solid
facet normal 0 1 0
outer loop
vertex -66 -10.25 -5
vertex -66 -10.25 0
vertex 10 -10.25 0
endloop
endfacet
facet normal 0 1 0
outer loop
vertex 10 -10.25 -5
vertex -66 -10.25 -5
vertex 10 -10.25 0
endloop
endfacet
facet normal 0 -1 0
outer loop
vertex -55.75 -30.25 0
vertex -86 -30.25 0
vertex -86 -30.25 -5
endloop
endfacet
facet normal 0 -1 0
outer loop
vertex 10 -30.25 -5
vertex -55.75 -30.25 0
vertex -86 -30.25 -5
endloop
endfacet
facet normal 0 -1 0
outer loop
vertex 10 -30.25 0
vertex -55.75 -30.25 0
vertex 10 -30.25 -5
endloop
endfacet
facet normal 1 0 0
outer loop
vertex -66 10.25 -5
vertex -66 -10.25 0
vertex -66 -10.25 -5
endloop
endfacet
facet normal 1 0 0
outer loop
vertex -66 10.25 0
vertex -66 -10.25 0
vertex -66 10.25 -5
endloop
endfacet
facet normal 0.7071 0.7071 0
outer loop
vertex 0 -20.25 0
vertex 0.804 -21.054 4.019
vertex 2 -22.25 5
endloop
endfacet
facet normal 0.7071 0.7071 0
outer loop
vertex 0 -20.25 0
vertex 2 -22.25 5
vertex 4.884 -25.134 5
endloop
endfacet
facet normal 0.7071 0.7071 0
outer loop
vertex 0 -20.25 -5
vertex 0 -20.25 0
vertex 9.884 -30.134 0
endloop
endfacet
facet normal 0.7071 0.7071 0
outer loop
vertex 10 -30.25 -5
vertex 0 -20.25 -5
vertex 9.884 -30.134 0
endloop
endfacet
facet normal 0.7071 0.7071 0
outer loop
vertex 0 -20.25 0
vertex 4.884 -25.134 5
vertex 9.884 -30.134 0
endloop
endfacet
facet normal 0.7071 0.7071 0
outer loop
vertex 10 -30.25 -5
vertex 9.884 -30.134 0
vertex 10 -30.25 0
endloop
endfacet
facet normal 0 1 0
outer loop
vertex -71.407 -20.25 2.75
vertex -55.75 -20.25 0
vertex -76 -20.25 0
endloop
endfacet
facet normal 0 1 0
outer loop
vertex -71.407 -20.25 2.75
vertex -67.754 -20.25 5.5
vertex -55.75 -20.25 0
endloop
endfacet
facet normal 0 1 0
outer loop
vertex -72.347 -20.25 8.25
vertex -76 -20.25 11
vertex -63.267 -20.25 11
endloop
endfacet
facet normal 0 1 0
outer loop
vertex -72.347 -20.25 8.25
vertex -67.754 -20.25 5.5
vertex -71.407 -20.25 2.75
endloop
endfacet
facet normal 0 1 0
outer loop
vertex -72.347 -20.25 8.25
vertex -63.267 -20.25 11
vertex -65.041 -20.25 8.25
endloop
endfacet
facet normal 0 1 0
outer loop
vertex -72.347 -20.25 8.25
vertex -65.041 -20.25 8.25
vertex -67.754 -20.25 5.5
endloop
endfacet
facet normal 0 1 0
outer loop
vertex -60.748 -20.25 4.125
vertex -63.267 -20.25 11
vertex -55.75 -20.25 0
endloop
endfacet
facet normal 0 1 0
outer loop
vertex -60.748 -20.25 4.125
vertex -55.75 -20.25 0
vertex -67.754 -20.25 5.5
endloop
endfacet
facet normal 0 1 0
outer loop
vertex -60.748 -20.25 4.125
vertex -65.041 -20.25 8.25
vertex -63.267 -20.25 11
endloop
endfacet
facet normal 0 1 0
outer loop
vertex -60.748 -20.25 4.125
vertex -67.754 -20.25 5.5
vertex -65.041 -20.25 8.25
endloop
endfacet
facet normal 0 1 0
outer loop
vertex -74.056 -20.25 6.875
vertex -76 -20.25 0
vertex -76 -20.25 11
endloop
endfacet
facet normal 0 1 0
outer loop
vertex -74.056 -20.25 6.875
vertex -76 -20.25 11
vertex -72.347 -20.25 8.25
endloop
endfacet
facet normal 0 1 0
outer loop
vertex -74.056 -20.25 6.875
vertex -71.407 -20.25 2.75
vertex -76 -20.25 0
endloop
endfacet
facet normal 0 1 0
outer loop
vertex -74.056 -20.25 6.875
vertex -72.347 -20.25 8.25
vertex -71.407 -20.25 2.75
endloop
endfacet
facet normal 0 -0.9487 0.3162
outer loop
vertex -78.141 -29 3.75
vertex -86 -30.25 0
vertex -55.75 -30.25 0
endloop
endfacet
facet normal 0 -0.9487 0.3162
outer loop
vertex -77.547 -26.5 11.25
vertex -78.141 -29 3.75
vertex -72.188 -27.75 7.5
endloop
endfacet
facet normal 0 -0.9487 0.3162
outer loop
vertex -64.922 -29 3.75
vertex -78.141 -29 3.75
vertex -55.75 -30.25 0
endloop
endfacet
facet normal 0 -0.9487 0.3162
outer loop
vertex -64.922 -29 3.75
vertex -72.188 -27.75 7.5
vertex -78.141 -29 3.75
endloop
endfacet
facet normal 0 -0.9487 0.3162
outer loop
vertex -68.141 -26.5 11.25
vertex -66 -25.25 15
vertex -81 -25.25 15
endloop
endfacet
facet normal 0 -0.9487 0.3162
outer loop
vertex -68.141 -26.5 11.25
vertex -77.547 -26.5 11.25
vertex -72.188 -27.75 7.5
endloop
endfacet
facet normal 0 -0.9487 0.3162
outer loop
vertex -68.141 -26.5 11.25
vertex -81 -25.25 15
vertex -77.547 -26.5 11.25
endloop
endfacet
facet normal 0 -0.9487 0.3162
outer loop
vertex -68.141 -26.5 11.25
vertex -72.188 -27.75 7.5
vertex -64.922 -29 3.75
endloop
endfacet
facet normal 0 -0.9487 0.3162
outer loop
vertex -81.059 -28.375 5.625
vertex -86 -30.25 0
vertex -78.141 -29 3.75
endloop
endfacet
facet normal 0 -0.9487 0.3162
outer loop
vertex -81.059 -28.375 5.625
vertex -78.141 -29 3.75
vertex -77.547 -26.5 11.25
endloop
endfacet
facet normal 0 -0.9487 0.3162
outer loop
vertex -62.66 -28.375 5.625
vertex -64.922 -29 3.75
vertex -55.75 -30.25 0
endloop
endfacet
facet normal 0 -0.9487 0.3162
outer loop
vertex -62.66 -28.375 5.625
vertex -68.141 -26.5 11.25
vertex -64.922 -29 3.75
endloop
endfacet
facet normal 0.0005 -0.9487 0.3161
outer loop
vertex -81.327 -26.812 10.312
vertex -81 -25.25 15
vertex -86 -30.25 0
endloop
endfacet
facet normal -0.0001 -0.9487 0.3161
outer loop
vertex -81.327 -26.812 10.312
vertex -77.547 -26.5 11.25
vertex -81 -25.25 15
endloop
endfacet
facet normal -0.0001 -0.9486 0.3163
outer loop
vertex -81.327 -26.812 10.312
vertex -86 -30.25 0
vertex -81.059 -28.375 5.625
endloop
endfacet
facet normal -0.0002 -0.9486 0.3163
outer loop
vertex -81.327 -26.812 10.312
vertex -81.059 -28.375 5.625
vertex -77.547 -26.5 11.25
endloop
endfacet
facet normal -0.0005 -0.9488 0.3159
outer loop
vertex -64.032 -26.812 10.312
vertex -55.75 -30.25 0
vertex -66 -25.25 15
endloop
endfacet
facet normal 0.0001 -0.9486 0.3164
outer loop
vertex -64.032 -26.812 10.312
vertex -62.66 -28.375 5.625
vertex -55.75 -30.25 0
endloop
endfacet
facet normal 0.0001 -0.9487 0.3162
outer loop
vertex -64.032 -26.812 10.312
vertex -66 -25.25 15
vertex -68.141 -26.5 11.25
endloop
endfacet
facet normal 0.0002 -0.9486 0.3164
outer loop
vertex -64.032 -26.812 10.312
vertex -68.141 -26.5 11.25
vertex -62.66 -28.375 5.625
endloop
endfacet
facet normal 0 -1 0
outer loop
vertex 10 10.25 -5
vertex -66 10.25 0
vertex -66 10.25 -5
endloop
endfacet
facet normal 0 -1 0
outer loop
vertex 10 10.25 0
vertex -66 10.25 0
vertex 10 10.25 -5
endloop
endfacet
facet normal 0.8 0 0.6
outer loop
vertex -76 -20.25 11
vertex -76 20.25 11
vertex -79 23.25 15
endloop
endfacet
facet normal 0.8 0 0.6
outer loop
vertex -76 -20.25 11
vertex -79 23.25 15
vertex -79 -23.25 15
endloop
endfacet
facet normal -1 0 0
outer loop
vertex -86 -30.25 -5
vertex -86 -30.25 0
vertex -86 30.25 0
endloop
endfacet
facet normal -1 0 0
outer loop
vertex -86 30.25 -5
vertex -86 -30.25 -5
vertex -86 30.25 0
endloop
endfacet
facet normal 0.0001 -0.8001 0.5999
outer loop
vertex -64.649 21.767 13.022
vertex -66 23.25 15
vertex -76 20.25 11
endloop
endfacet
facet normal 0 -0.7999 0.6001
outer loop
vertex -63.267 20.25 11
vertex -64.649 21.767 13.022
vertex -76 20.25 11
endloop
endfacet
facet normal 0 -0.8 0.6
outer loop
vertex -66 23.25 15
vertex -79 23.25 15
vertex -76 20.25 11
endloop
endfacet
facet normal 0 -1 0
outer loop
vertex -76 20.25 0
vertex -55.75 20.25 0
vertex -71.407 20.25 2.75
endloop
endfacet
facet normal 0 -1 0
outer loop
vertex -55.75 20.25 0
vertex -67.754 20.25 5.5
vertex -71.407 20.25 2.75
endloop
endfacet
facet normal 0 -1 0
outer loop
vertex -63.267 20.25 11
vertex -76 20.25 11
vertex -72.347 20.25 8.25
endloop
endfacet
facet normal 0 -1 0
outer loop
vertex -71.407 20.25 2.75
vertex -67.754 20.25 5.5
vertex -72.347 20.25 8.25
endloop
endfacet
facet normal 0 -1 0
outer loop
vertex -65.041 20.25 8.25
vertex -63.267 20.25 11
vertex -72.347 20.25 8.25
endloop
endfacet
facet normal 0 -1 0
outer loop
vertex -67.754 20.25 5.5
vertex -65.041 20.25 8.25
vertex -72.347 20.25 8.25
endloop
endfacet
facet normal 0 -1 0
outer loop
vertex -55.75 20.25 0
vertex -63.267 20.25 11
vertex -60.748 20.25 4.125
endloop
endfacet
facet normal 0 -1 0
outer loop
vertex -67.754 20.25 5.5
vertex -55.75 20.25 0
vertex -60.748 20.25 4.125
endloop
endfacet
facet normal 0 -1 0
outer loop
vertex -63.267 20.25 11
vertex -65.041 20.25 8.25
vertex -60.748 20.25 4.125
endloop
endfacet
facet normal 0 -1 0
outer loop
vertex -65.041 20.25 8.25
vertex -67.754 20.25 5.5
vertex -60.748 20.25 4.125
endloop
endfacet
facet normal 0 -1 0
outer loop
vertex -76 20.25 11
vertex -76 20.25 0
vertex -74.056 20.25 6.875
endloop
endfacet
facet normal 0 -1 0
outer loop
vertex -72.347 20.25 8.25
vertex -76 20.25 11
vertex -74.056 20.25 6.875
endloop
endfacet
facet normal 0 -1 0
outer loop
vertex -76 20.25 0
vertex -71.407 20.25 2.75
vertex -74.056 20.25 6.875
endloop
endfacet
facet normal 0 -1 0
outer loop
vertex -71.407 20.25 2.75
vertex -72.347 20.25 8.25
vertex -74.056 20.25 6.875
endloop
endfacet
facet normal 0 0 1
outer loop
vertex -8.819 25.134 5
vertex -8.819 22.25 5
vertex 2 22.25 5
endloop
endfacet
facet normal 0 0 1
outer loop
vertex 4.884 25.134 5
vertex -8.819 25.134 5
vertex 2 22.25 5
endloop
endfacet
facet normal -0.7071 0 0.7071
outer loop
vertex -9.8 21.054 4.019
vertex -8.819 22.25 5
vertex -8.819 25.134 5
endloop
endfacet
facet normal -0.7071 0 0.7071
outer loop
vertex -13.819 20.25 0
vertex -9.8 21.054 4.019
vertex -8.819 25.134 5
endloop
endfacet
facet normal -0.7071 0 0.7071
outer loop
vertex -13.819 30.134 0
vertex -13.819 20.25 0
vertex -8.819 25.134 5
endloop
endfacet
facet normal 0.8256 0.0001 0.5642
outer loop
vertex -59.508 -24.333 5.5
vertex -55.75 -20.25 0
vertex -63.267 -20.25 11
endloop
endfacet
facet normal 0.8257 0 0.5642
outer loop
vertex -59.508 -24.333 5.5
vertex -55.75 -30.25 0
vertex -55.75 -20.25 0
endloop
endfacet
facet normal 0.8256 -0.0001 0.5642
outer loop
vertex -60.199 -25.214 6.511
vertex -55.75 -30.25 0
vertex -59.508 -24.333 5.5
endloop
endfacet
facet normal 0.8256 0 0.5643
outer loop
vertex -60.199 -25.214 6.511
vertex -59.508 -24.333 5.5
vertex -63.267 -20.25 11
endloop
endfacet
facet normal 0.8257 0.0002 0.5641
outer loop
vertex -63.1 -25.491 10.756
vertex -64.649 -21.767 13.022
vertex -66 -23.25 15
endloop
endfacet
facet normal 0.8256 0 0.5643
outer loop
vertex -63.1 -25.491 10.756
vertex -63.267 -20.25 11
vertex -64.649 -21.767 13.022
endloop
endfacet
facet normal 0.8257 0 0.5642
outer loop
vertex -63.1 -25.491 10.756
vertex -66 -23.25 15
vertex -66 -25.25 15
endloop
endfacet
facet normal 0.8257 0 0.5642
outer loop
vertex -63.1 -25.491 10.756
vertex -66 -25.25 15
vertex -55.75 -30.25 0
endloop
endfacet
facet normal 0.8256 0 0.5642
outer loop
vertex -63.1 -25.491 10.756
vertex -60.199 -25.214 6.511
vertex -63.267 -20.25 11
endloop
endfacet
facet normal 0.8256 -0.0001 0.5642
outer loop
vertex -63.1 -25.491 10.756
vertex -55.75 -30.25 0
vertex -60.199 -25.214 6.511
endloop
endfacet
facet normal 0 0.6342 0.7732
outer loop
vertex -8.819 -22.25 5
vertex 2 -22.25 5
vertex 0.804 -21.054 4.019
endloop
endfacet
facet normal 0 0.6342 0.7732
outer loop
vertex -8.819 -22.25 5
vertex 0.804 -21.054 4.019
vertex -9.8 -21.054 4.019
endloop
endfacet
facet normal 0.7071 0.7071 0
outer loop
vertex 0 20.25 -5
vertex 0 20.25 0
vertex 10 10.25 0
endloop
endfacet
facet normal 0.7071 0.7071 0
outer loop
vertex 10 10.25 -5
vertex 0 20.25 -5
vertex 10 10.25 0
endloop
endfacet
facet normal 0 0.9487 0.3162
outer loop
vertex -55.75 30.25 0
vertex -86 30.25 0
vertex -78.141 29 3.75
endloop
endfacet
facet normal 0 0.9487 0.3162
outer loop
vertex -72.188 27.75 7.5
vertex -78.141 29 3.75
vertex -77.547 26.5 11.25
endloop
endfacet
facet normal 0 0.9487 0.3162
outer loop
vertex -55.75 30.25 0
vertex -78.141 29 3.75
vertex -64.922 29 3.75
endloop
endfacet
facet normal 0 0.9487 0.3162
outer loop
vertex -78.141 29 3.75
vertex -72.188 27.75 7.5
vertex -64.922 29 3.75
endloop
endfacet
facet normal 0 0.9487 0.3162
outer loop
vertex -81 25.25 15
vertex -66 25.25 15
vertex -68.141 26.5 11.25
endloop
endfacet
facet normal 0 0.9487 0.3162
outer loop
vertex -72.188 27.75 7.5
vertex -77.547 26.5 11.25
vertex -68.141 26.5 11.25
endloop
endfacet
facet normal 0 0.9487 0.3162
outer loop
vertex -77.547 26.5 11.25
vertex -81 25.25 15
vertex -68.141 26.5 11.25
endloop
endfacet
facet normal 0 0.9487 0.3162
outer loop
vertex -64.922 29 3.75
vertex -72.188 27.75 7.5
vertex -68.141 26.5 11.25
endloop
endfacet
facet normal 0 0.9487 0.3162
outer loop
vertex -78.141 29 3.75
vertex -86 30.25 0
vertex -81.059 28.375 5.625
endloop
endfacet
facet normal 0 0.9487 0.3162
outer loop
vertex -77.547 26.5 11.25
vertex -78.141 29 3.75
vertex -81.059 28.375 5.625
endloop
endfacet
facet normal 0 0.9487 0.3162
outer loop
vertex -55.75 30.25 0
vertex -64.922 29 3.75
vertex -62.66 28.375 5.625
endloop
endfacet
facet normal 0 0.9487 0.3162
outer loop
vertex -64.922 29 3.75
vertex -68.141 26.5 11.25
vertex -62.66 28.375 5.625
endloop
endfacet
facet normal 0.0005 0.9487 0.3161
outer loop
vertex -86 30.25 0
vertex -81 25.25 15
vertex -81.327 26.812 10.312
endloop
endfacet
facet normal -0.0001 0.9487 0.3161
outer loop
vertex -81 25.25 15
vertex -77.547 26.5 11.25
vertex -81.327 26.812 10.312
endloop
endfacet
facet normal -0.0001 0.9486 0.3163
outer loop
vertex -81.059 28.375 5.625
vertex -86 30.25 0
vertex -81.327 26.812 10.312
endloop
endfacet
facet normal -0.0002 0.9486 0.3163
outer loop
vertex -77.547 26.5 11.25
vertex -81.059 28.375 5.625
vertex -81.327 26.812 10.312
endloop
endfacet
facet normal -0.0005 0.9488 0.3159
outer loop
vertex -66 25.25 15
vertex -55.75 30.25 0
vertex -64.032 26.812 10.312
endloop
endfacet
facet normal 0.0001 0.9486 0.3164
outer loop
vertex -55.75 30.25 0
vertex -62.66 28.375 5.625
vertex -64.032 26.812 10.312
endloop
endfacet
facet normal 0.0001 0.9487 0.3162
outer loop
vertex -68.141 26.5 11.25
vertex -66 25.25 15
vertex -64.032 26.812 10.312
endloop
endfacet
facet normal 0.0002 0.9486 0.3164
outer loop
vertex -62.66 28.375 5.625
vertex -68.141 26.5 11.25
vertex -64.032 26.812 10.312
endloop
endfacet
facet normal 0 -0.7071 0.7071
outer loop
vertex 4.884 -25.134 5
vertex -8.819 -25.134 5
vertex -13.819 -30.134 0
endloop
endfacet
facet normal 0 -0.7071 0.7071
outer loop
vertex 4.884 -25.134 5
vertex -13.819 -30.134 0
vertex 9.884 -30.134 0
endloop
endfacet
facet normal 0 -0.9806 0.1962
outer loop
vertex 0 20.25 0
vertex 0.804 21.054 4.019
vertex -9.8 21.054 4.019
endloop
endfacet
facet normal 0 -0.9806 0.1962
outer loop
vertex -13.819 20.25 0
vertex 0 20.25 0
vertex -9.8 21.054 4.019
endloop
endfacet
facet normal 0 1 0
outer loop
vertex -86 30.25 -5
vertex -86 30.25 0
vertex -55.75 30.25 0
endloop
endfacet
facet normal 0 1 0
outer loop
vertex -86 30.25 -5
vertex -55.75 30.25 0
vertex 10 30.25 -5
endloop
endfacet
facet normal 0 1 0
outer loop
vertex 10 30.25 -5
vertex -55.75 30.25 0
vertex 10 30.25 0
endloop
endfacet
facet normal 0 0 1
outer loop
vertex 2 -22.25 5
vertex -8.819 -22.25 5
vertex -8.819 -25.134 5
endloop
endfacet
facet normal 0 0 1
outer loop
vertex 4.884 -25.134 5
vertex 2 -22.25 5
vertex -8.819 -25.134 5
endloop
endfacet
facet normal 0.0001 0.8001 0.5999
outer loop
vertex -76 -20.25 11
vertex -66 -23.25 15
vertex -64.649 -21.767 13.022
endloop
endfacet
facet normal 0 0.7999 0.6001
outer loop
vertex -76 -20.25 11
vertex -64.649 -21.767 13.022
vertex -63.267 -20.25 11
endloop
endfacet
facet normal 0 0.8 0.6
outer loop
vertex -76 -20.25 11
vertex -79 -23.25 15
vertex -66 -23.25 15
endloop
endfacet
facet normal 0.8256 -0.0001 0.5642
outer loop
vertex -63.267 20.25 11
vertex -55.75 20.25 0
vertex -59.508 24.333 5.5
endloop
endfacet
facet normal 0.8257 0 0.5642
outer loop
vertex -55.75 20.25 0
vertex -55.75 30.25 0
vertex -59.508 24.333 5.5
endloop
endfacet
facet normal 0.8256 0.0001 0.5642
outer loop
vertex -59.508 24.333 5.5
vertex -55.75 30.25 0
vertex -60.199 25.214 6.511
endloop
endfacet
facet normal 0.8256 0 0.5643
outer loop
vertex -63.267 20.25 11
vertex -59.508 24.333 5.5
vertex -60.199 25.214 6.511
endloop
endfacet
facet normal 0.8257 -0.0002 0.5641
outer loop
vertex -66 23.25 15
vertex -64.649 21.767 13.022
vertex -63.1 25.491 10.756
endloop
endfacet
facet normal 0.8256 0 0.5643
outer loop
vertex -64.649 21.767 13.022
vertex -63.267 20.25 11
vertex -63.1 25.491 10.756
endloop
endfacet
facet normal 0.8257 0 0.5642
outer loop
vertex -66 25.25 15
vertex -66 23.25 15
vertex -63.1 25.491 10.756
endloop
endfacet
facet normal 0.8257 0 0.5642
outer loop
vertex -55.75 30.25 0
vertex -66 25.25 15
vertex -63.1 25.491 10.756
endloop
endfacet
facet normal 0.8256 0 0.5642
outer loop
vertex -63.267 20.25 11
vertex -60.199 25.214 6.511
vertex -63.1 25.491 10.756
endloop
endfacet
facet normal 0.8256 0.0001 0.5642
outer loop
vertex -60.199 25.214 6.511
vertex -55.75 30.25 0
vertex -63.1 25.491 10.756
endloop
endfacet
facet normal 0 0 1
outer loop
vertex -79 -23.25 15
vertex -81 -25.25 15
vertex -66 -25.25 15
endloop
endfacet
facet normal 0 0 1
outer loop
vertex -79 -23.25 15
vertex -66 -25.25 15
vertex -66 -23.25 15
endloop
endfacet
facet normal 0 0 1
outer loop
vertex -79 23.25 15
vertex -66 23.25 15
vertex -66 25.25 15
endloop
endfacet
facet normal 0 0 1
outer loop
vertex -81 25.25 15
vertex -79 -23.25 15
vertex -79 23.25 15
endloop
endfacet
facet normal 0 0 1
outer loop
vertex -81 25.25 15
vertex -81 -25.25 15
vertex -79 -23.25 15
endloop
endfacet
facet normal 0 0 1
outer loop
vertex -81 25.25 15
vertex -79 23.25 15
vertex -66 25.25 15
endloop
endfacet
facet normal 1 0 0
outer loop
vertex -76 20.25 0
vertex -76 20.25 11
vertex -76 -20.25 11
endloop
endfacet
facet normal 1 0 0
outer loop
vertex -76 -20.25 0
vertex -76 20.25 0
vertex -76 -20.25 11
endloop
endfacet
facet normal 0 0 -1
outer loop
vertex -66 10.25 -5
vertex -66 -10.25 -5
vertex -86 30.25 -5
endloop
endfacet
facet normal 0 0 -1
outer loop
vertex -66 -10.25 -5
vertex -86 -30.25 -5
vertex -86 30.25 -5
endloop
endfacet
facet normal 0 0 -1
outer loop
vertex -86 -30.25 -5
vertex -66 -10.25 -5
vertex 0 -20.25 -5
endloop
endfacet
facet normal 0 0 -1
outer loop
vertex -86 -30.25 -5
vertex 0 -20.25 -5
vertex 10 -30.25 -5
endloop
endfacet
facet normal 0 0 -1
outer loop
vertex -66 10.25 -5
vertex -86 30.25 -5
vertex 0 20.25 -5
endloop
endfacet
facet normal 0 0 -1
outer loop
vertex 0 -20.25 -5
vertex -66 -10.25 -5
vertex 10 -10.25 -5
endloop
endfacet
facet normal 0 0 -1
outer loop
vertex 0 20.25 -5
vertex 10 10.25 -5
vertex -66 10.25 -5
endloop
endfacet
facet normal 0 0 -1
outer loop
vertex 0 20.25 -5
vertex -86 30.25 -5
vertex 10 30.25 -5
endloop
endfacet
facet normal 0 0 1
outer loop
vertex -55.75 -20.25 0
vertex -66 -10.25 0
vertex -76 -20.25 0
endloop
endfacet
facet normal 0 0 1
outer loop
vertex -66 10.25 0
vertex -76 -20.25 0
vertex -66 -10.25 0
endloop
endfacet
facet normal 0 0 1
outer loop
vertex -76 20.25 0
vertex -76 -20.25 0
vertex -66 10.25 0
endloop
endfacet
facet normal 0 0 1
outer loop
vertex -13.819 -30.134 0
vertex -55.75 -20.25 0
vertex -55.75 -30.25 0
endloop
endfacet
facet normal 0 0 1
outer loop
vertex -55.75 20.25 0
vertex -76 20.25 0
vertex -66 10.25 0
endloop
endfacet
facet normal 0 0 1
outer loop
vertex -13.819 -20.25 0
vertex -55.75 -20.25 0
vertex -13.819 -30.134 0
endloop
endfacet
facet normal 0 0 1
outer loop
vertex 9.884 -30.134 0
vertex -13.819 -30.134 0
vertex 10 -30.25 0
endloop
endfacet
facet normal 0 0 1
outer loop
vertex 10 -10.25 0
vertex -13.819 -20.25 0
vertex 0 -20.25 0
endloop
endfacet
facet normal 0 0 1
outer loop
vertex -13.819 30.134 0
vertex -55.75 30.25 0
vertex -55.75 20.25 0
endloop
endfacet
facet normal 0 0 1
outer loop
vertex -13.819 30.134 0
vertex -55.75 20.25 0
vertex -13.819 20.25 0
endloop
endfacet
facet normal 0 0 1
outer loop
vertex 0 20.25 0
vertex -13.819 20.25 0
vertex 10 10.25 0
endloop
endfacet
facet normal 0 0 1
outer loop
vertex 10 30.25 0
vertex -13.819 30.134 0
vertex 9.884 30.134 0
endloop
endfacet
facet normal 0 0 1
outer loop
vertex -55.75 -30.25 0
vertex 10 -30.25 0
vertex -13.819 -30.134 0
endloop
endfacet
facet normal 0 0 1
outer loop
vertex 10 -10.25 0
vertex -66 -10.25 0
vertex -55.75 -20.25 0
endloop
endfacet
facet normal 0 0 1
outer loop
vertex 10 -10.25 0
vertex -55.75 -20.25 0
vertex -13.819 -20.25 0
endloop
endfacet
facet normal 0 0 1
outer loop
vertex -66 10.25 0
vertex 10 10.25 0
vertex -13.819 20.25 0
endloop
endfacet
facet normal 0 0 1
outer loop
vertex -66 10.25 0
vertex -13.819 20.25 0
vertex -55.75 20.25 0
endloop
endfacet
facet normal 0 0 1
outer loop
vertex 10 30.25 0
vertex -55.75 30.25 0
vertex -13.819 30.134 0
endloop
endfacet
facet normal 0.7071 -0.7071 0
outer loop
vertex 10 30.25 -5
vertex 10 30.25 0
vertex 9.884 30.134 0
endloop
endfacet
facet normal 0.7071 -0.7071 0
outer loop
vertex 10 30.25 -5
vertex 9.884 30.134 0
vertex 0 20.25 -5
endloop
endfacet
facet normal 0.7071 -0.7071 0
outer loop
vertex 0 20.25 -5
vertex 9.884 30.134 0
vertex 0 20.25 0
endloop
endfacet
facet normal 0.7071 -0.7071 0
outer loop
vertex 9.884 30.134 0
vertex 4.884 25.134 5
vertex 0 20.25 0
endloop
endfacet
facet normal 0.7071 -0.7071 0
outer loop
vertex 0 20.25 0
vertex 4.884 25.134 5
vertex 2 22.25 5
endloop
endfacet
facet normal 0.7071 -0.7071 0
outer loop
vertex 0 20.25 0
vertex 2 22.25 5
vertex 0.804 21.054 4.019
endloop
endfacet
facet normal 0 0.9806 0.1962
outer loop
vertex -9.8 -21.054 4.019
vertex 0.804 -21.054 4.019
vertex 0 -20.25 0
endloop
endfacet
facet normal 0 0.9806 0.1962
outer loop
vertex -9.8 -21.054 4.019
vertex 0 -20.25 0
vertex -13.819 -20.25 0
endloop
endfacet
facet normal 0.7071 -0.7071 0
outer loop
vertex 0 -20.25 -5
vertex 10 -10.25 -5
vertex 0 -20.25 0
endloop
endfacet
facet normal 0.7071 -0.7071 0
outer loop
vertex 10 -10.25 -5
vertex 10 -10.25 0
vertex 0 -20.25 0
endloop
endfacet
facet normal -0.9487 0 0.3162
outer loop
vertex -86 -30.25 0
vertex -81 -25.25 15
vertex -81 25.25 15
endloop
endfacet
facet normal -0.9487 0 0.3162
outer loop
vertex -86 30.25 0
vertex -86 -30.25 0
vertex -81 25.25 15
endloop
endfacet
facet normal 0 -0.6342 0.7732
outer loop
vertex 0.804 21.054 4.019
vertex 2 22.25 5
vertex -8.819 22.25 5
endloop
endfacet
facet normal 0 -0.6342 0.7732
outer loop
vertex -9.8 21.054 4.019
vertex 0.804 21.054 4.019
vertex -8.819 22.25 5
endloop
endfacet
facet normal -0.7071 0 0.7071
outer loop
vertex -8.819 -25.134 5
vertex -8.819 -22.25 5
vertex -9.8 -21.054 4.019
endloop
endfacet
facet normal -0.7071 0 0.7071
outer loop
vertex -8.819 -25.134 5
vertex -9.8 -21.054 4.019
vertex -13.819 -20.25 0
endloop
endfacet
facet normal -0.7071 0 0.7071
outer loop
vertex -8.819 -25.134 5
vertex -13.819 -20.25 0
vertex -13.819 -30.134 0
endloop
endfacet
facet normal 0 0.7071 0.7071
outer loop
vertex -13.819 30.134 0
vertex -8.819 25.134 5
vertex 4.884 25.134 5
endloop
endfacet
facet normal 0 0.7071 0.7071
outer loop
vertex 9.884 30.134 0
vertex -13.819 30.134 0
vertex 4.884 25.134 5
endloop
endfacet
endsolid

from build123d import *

# Parameters (mm, degrees)
F0_W           = 172
F0_H           = 60.5
F4_DEPTH       = 5
F6_SIZE2       = 4
F6_SIZE        = 3
F9_DEPTH       = 5
F10_SIZE       = 4.99999
F11_SIZE2      = 0.99999
F11_SIZE       = 4.99999
F12_SIZE       = 1
F14_W          = 132
F14_H          = 20.5
F15_DEPTH      = 12.5
F17_DEPTH      = 25
F17_DEPTH_BACK = 25


# Not quite as in the source:
# - a fillet or chamfer is up to 0.001 mm smaller than in the source, because OpenCascade refuses the exact size


with BuildPart() as f4:
    # F0 (on Top) → F4 (new body)
    with BuildSketch(Plane.XY):
        Rectangle(F0_W, F0_H)
    extrude(amount=-F4_DEPTH)

    # F3 (on Top) → F5 section 0
    with BuildSketch(Plane.XY):
        Polygon((-86, 0), (-86, -30.25), (-55.75, -30.25), (-55.75, -20.25), (-76, -20.25), (-76, 0), align=None)
    # F2 (on offset) → F5 section 1
    with BuildSketch(Plane.XY.offset(15)):
        Polygon((-76, -20.25), (-76, 0), (-81, 0), (-81, -25.25), (-66, -25.25), (-66, -20.25), align=None)
    loft()

    # F6
    f6_edges = [f4.edges().sort_by_distance(p)[0] for p in [
        (-76, -10.125, 15),
        (-71, -20.25, 15),
    ]]
    chamfer(f6_edges, length=F6_SIZE, length2=F6_SIZE2)

    # F7: F4 across plane


with BuildPart() as f4_1:
    add(f4.part)
    add(f4.part.mirror(Plane.YZ))

    # F8 (on face) → F9 (join)
    with BuildSketch(Plane.XY):
        Polygon((13.8189587742, -20.25), (0, -20.25), (-13.8189587742, -20.25), (-13.8189587742, -30.1344580948), (0, -30.1344580948), (13.8189587742, -30.1344580948), align=None)
    extrude(amount=F9_DEPTH)

    # F10 (size 5 in the source; OpenCascade refuses exactly that, so slightly less here)
    f10_edges = [f4_1.edges().sort_by_distance(p)[0] for p in [
        (13.818959, -25.192229, 5),
        (0, -30.134458, 5),
        (-13.818959, -25.192229, 5),
    ]]
    chamfer(f10_edges, length=F10_SIZE)

    # F11 (size 5 and 1 in the source; OpenCascade refuses exactly that, so slightly less here)
    f11_edges = [f4_1.edges().sort_by_distance(p)[0] for p in [
        (0, -20.25, 5),
    ]]
    f11_side = f4_1.faces().sort_by_distance((0, -20.25, 2.315943))[0]
    chamfer(f11_edges, length=F11_SIZE, length2=F11_SIZE2, reference=f11_side)

    # F12
    f12_edges = [f4_1.edges().sort_by_distance(p)[0] for p in [
        (0, -21.24999, 5),
    ]]
    chamfer(f12_edges, length=F12_SIZE)

    # F13: F4 across plane


with BuildPart() as f4_2:
    add(f4_1.part)
    add(f4_1.part.mirror(Plane.XZ))

    # F14 (on Top) → F15 (cut, symmetric)
    with BuildSketch(Plane.XY):
        Rectangle(F14_W, F14_H)
    extrude(amount=F15_DEPTH, both=True, mode=Mode.SUBTRACT)


with BuildPart() as f17:
    # F16 (on Top) → F17 (new body, two sides)
    with BuildSketch(Plane.XY) as f17_sk:
        Polygon((23.7979591321, 44.0479591321), (0, 20.25), (18.644013716, 1.605986284), (18.644013716, -1.605986284), (0, -20.25), (26.894013716, -47.144013716), (91.0670285058, -47.144013716), (91.0670285058, 44.0479591321), align=None)
    extrude(amount=F17_DEPTH)
    extrude(f17_sk.sketch, amount=-F17_DEPTH_BACK)


with BuildPart() as f4_3:
    add(f4_2.part)

    # F18: cut F17
    add(f17.part, mode=Mode.SUBTRACT)


solid = f4_3.part
